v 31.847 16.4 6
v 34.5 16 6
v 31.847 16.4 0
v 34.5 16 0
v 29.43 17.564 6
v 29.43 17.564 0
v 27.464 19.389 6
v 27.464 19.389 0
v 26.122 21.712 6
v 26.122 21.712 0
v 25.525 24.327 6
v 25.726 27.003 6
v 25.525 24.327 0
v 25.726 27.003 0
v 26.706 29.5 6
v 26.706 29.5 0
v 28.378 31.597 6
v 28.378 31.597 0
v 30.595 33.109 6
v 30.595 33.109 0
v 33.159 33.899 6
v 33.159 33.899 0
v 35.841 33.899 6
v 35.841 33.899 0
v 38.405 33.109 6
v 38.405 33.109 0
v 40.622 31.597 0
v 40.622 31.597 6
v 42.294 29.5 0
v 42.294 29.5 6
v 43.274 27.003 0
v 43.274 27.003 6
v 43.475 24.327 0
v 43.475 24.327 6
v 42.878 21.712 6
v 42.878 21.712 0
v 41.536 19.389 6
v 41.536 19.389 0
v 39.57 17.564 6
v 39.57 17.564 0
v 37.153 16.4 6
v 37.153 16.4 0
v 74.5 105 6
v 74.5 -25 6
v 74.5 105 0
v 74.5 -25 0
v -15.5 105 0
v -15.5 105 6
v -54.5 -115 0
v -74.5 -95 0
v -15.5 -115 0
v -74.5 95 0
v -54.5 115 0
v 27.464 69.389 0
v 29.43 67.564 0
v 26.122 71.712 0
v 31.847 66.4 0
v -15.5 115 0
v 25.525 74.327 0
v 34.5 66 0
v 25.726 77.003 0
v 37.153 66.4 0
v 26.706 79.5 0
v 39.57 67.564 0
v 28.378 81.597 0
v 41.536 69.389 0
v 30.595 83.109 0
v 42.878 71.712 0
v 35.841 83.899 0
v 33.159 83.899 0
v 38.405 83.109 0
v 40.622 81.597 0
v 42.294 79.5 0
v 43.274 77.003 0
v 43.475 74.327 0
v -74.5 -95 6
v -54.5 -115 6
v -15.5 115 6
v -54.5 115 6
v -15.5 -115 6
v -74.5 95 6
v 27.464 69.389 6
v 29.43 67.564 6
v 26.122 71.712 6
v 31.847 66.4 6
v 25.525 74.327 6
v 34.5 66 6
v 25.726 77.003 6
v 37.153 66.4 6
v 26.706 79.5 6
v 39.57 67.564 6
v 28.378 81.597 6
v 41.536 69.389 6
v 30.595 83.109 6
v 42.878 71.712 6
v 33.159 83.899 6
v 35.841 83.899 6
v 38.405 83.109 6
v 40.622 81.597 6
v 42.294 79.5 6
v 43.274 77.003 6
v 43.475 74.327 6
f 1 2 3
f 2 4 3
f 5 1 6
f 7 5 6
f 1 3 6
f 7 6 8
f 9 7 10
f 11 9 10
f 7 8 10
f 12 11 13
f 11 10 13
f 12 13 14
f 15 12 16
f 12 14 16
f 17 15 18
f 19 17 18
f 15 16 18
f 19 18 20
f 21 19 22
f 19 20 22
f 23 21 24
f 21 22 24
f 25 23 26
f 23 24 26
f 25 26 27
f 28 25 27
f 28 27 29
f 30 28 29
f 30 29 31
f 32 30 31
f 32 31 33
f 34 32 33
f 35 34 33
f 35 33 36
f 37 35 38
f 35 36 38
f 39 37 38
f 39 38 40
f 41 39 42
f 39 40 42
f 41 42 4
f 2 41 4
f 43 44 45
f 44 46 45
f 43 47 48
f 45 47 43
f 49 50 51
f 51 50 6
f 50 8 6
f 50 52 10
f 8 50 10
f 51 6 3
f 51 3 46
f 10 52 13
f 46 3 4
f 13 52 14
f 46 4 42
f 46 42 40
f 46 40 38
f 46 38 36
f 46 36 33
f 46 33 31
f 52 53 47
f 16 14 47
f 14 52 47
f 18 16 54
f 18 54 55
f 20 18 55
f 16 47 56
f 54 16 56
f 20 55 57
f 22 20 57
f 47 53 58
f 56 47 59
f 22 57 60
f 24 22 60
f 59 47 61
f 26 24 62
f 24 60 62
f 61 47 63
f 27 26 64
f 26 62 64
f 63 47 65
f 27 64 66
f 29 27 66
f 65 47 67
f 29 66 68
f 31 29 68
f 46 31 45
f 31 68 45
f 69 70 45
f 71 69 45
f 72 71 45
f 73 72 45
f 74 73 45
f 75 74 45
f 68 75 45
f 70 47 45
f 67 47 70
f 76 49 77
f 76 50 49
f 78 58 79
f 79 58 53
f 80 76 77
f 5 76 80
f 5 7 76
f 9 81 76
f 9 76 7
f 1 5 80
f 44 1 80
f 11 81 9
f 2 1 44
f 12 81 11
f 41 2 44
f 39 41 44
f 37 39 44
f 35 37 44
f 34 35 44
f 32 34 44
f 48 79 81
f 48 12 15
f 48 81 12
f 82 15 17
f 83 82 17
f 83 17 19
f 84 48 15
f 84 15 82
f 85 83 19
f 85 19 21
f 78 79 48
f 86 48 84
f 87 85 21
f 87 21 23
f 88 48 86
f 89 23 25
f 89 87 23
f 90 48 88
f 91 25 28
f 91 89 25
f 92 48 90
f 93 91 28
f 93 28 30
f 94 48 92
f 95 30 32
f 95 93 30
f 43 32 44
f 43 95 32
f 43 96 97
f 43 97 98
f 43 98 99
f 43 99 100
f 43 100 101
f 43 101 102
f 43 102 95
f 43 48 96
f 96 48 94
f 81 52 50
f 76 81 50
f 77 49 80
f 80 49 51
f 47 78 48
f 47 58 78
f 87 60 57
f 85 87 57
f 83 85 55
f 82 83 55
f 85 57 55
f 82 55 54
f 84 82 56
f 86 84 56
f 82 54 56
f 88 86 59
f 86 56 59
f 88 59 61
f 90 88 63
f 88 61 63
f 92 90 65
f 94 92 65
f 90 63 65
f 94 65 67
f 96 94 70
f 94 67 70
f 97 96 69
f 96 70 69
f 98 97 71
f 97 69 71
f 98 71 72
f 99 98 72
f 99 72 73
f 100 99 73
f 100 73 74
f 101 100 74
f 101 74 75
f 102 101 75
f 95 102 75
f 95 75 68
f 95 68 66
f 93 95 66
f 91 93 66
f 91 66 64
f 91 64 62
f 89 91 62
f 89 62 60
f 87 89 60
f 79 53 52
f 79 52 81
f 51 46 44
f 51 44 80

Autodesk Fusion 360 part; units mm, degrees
sketch "スケッチ1" plane through (0, 0, 0) normal (0, 0, 1) x (1, 0, 0)
  line L0 (-15.5, 115) -> (-74.5, 115)
  line L1 (-74.5, 115) -> (-74.5, -115)
  line L2 (-74.5, -115) -> (-15.5, -115)
  line L3 (74.5, -25) -> (74.5, 105)
  line L4 (68.0217, 105) -> (-74.5, -115) construction
  line L5 (-74.5, 115) -> (39.1174, -60.3826) construction
  line L6 (-15.5, 115) -> (-15.5, 105)
  line L7 (-15.5, 105) -> (74.5, 105)
  line L8 (-74.5, -115) -> (-15.5, -115) construction
  line L9 (74.5, -25) -> (-15.5, -115)
  dimension "d2" = 230
  dimension "d5" = 59
extrude "押し出し1" add sketch "スケッチ1" along normal blind 6
chamfer "面取り1" distance 20 angle 45 2 edges at (-74.5, -115, 3) (-74.5, 115, 3)
sketch "スケッチ2" plane through (0, 0, 6) normal (0, 0, 1) x (-1, 0, 0)
  line L0 (54.5, -115) -> (74.5, -95)
  line L1 (74.5, -95) -> (74.5, 95)
  line L2 (74.5, 95) -> (54.5, 115)
  line L3 (54.5, 115) -> (15.5, 115)
  line L4 (15.5, 115) -> (-74.5, 25)
  line L5 (-74.5, 25) -> (-74.5, -105)
  line L6 (-74.5, -105) -> (15.5, -105)
  line L7 (15.5, -105) -> (15.5, -115)
  line L8 (15.5, -115) -> (54.5, -115)
  line L9 (-74.5, -105) -> (-34.5, -105) construction
  line L10 (-34.5, -105) -> (-34.5, -75) construction
  line L11 (-34.5, -75) -> (-74.5, -75) construction
  line L12 (-74.5, -75) -> (-74.5, -105) construction
  line L13 (-34.5, -75) -> (-34.5, -25) construction
  point P0 (-34.5, -75)
  point P1 (-34.5, -25)
  dimension "d10" = 40
  dimension "d11" = 30
  dimension "d12" = 50
hole "穴1" at (34.5, 75, 6) at (34.5, 25, 6) direction (0, 0, -1) diameter 18 end through all
equation "d5 = 20 mm + 39 mm"
